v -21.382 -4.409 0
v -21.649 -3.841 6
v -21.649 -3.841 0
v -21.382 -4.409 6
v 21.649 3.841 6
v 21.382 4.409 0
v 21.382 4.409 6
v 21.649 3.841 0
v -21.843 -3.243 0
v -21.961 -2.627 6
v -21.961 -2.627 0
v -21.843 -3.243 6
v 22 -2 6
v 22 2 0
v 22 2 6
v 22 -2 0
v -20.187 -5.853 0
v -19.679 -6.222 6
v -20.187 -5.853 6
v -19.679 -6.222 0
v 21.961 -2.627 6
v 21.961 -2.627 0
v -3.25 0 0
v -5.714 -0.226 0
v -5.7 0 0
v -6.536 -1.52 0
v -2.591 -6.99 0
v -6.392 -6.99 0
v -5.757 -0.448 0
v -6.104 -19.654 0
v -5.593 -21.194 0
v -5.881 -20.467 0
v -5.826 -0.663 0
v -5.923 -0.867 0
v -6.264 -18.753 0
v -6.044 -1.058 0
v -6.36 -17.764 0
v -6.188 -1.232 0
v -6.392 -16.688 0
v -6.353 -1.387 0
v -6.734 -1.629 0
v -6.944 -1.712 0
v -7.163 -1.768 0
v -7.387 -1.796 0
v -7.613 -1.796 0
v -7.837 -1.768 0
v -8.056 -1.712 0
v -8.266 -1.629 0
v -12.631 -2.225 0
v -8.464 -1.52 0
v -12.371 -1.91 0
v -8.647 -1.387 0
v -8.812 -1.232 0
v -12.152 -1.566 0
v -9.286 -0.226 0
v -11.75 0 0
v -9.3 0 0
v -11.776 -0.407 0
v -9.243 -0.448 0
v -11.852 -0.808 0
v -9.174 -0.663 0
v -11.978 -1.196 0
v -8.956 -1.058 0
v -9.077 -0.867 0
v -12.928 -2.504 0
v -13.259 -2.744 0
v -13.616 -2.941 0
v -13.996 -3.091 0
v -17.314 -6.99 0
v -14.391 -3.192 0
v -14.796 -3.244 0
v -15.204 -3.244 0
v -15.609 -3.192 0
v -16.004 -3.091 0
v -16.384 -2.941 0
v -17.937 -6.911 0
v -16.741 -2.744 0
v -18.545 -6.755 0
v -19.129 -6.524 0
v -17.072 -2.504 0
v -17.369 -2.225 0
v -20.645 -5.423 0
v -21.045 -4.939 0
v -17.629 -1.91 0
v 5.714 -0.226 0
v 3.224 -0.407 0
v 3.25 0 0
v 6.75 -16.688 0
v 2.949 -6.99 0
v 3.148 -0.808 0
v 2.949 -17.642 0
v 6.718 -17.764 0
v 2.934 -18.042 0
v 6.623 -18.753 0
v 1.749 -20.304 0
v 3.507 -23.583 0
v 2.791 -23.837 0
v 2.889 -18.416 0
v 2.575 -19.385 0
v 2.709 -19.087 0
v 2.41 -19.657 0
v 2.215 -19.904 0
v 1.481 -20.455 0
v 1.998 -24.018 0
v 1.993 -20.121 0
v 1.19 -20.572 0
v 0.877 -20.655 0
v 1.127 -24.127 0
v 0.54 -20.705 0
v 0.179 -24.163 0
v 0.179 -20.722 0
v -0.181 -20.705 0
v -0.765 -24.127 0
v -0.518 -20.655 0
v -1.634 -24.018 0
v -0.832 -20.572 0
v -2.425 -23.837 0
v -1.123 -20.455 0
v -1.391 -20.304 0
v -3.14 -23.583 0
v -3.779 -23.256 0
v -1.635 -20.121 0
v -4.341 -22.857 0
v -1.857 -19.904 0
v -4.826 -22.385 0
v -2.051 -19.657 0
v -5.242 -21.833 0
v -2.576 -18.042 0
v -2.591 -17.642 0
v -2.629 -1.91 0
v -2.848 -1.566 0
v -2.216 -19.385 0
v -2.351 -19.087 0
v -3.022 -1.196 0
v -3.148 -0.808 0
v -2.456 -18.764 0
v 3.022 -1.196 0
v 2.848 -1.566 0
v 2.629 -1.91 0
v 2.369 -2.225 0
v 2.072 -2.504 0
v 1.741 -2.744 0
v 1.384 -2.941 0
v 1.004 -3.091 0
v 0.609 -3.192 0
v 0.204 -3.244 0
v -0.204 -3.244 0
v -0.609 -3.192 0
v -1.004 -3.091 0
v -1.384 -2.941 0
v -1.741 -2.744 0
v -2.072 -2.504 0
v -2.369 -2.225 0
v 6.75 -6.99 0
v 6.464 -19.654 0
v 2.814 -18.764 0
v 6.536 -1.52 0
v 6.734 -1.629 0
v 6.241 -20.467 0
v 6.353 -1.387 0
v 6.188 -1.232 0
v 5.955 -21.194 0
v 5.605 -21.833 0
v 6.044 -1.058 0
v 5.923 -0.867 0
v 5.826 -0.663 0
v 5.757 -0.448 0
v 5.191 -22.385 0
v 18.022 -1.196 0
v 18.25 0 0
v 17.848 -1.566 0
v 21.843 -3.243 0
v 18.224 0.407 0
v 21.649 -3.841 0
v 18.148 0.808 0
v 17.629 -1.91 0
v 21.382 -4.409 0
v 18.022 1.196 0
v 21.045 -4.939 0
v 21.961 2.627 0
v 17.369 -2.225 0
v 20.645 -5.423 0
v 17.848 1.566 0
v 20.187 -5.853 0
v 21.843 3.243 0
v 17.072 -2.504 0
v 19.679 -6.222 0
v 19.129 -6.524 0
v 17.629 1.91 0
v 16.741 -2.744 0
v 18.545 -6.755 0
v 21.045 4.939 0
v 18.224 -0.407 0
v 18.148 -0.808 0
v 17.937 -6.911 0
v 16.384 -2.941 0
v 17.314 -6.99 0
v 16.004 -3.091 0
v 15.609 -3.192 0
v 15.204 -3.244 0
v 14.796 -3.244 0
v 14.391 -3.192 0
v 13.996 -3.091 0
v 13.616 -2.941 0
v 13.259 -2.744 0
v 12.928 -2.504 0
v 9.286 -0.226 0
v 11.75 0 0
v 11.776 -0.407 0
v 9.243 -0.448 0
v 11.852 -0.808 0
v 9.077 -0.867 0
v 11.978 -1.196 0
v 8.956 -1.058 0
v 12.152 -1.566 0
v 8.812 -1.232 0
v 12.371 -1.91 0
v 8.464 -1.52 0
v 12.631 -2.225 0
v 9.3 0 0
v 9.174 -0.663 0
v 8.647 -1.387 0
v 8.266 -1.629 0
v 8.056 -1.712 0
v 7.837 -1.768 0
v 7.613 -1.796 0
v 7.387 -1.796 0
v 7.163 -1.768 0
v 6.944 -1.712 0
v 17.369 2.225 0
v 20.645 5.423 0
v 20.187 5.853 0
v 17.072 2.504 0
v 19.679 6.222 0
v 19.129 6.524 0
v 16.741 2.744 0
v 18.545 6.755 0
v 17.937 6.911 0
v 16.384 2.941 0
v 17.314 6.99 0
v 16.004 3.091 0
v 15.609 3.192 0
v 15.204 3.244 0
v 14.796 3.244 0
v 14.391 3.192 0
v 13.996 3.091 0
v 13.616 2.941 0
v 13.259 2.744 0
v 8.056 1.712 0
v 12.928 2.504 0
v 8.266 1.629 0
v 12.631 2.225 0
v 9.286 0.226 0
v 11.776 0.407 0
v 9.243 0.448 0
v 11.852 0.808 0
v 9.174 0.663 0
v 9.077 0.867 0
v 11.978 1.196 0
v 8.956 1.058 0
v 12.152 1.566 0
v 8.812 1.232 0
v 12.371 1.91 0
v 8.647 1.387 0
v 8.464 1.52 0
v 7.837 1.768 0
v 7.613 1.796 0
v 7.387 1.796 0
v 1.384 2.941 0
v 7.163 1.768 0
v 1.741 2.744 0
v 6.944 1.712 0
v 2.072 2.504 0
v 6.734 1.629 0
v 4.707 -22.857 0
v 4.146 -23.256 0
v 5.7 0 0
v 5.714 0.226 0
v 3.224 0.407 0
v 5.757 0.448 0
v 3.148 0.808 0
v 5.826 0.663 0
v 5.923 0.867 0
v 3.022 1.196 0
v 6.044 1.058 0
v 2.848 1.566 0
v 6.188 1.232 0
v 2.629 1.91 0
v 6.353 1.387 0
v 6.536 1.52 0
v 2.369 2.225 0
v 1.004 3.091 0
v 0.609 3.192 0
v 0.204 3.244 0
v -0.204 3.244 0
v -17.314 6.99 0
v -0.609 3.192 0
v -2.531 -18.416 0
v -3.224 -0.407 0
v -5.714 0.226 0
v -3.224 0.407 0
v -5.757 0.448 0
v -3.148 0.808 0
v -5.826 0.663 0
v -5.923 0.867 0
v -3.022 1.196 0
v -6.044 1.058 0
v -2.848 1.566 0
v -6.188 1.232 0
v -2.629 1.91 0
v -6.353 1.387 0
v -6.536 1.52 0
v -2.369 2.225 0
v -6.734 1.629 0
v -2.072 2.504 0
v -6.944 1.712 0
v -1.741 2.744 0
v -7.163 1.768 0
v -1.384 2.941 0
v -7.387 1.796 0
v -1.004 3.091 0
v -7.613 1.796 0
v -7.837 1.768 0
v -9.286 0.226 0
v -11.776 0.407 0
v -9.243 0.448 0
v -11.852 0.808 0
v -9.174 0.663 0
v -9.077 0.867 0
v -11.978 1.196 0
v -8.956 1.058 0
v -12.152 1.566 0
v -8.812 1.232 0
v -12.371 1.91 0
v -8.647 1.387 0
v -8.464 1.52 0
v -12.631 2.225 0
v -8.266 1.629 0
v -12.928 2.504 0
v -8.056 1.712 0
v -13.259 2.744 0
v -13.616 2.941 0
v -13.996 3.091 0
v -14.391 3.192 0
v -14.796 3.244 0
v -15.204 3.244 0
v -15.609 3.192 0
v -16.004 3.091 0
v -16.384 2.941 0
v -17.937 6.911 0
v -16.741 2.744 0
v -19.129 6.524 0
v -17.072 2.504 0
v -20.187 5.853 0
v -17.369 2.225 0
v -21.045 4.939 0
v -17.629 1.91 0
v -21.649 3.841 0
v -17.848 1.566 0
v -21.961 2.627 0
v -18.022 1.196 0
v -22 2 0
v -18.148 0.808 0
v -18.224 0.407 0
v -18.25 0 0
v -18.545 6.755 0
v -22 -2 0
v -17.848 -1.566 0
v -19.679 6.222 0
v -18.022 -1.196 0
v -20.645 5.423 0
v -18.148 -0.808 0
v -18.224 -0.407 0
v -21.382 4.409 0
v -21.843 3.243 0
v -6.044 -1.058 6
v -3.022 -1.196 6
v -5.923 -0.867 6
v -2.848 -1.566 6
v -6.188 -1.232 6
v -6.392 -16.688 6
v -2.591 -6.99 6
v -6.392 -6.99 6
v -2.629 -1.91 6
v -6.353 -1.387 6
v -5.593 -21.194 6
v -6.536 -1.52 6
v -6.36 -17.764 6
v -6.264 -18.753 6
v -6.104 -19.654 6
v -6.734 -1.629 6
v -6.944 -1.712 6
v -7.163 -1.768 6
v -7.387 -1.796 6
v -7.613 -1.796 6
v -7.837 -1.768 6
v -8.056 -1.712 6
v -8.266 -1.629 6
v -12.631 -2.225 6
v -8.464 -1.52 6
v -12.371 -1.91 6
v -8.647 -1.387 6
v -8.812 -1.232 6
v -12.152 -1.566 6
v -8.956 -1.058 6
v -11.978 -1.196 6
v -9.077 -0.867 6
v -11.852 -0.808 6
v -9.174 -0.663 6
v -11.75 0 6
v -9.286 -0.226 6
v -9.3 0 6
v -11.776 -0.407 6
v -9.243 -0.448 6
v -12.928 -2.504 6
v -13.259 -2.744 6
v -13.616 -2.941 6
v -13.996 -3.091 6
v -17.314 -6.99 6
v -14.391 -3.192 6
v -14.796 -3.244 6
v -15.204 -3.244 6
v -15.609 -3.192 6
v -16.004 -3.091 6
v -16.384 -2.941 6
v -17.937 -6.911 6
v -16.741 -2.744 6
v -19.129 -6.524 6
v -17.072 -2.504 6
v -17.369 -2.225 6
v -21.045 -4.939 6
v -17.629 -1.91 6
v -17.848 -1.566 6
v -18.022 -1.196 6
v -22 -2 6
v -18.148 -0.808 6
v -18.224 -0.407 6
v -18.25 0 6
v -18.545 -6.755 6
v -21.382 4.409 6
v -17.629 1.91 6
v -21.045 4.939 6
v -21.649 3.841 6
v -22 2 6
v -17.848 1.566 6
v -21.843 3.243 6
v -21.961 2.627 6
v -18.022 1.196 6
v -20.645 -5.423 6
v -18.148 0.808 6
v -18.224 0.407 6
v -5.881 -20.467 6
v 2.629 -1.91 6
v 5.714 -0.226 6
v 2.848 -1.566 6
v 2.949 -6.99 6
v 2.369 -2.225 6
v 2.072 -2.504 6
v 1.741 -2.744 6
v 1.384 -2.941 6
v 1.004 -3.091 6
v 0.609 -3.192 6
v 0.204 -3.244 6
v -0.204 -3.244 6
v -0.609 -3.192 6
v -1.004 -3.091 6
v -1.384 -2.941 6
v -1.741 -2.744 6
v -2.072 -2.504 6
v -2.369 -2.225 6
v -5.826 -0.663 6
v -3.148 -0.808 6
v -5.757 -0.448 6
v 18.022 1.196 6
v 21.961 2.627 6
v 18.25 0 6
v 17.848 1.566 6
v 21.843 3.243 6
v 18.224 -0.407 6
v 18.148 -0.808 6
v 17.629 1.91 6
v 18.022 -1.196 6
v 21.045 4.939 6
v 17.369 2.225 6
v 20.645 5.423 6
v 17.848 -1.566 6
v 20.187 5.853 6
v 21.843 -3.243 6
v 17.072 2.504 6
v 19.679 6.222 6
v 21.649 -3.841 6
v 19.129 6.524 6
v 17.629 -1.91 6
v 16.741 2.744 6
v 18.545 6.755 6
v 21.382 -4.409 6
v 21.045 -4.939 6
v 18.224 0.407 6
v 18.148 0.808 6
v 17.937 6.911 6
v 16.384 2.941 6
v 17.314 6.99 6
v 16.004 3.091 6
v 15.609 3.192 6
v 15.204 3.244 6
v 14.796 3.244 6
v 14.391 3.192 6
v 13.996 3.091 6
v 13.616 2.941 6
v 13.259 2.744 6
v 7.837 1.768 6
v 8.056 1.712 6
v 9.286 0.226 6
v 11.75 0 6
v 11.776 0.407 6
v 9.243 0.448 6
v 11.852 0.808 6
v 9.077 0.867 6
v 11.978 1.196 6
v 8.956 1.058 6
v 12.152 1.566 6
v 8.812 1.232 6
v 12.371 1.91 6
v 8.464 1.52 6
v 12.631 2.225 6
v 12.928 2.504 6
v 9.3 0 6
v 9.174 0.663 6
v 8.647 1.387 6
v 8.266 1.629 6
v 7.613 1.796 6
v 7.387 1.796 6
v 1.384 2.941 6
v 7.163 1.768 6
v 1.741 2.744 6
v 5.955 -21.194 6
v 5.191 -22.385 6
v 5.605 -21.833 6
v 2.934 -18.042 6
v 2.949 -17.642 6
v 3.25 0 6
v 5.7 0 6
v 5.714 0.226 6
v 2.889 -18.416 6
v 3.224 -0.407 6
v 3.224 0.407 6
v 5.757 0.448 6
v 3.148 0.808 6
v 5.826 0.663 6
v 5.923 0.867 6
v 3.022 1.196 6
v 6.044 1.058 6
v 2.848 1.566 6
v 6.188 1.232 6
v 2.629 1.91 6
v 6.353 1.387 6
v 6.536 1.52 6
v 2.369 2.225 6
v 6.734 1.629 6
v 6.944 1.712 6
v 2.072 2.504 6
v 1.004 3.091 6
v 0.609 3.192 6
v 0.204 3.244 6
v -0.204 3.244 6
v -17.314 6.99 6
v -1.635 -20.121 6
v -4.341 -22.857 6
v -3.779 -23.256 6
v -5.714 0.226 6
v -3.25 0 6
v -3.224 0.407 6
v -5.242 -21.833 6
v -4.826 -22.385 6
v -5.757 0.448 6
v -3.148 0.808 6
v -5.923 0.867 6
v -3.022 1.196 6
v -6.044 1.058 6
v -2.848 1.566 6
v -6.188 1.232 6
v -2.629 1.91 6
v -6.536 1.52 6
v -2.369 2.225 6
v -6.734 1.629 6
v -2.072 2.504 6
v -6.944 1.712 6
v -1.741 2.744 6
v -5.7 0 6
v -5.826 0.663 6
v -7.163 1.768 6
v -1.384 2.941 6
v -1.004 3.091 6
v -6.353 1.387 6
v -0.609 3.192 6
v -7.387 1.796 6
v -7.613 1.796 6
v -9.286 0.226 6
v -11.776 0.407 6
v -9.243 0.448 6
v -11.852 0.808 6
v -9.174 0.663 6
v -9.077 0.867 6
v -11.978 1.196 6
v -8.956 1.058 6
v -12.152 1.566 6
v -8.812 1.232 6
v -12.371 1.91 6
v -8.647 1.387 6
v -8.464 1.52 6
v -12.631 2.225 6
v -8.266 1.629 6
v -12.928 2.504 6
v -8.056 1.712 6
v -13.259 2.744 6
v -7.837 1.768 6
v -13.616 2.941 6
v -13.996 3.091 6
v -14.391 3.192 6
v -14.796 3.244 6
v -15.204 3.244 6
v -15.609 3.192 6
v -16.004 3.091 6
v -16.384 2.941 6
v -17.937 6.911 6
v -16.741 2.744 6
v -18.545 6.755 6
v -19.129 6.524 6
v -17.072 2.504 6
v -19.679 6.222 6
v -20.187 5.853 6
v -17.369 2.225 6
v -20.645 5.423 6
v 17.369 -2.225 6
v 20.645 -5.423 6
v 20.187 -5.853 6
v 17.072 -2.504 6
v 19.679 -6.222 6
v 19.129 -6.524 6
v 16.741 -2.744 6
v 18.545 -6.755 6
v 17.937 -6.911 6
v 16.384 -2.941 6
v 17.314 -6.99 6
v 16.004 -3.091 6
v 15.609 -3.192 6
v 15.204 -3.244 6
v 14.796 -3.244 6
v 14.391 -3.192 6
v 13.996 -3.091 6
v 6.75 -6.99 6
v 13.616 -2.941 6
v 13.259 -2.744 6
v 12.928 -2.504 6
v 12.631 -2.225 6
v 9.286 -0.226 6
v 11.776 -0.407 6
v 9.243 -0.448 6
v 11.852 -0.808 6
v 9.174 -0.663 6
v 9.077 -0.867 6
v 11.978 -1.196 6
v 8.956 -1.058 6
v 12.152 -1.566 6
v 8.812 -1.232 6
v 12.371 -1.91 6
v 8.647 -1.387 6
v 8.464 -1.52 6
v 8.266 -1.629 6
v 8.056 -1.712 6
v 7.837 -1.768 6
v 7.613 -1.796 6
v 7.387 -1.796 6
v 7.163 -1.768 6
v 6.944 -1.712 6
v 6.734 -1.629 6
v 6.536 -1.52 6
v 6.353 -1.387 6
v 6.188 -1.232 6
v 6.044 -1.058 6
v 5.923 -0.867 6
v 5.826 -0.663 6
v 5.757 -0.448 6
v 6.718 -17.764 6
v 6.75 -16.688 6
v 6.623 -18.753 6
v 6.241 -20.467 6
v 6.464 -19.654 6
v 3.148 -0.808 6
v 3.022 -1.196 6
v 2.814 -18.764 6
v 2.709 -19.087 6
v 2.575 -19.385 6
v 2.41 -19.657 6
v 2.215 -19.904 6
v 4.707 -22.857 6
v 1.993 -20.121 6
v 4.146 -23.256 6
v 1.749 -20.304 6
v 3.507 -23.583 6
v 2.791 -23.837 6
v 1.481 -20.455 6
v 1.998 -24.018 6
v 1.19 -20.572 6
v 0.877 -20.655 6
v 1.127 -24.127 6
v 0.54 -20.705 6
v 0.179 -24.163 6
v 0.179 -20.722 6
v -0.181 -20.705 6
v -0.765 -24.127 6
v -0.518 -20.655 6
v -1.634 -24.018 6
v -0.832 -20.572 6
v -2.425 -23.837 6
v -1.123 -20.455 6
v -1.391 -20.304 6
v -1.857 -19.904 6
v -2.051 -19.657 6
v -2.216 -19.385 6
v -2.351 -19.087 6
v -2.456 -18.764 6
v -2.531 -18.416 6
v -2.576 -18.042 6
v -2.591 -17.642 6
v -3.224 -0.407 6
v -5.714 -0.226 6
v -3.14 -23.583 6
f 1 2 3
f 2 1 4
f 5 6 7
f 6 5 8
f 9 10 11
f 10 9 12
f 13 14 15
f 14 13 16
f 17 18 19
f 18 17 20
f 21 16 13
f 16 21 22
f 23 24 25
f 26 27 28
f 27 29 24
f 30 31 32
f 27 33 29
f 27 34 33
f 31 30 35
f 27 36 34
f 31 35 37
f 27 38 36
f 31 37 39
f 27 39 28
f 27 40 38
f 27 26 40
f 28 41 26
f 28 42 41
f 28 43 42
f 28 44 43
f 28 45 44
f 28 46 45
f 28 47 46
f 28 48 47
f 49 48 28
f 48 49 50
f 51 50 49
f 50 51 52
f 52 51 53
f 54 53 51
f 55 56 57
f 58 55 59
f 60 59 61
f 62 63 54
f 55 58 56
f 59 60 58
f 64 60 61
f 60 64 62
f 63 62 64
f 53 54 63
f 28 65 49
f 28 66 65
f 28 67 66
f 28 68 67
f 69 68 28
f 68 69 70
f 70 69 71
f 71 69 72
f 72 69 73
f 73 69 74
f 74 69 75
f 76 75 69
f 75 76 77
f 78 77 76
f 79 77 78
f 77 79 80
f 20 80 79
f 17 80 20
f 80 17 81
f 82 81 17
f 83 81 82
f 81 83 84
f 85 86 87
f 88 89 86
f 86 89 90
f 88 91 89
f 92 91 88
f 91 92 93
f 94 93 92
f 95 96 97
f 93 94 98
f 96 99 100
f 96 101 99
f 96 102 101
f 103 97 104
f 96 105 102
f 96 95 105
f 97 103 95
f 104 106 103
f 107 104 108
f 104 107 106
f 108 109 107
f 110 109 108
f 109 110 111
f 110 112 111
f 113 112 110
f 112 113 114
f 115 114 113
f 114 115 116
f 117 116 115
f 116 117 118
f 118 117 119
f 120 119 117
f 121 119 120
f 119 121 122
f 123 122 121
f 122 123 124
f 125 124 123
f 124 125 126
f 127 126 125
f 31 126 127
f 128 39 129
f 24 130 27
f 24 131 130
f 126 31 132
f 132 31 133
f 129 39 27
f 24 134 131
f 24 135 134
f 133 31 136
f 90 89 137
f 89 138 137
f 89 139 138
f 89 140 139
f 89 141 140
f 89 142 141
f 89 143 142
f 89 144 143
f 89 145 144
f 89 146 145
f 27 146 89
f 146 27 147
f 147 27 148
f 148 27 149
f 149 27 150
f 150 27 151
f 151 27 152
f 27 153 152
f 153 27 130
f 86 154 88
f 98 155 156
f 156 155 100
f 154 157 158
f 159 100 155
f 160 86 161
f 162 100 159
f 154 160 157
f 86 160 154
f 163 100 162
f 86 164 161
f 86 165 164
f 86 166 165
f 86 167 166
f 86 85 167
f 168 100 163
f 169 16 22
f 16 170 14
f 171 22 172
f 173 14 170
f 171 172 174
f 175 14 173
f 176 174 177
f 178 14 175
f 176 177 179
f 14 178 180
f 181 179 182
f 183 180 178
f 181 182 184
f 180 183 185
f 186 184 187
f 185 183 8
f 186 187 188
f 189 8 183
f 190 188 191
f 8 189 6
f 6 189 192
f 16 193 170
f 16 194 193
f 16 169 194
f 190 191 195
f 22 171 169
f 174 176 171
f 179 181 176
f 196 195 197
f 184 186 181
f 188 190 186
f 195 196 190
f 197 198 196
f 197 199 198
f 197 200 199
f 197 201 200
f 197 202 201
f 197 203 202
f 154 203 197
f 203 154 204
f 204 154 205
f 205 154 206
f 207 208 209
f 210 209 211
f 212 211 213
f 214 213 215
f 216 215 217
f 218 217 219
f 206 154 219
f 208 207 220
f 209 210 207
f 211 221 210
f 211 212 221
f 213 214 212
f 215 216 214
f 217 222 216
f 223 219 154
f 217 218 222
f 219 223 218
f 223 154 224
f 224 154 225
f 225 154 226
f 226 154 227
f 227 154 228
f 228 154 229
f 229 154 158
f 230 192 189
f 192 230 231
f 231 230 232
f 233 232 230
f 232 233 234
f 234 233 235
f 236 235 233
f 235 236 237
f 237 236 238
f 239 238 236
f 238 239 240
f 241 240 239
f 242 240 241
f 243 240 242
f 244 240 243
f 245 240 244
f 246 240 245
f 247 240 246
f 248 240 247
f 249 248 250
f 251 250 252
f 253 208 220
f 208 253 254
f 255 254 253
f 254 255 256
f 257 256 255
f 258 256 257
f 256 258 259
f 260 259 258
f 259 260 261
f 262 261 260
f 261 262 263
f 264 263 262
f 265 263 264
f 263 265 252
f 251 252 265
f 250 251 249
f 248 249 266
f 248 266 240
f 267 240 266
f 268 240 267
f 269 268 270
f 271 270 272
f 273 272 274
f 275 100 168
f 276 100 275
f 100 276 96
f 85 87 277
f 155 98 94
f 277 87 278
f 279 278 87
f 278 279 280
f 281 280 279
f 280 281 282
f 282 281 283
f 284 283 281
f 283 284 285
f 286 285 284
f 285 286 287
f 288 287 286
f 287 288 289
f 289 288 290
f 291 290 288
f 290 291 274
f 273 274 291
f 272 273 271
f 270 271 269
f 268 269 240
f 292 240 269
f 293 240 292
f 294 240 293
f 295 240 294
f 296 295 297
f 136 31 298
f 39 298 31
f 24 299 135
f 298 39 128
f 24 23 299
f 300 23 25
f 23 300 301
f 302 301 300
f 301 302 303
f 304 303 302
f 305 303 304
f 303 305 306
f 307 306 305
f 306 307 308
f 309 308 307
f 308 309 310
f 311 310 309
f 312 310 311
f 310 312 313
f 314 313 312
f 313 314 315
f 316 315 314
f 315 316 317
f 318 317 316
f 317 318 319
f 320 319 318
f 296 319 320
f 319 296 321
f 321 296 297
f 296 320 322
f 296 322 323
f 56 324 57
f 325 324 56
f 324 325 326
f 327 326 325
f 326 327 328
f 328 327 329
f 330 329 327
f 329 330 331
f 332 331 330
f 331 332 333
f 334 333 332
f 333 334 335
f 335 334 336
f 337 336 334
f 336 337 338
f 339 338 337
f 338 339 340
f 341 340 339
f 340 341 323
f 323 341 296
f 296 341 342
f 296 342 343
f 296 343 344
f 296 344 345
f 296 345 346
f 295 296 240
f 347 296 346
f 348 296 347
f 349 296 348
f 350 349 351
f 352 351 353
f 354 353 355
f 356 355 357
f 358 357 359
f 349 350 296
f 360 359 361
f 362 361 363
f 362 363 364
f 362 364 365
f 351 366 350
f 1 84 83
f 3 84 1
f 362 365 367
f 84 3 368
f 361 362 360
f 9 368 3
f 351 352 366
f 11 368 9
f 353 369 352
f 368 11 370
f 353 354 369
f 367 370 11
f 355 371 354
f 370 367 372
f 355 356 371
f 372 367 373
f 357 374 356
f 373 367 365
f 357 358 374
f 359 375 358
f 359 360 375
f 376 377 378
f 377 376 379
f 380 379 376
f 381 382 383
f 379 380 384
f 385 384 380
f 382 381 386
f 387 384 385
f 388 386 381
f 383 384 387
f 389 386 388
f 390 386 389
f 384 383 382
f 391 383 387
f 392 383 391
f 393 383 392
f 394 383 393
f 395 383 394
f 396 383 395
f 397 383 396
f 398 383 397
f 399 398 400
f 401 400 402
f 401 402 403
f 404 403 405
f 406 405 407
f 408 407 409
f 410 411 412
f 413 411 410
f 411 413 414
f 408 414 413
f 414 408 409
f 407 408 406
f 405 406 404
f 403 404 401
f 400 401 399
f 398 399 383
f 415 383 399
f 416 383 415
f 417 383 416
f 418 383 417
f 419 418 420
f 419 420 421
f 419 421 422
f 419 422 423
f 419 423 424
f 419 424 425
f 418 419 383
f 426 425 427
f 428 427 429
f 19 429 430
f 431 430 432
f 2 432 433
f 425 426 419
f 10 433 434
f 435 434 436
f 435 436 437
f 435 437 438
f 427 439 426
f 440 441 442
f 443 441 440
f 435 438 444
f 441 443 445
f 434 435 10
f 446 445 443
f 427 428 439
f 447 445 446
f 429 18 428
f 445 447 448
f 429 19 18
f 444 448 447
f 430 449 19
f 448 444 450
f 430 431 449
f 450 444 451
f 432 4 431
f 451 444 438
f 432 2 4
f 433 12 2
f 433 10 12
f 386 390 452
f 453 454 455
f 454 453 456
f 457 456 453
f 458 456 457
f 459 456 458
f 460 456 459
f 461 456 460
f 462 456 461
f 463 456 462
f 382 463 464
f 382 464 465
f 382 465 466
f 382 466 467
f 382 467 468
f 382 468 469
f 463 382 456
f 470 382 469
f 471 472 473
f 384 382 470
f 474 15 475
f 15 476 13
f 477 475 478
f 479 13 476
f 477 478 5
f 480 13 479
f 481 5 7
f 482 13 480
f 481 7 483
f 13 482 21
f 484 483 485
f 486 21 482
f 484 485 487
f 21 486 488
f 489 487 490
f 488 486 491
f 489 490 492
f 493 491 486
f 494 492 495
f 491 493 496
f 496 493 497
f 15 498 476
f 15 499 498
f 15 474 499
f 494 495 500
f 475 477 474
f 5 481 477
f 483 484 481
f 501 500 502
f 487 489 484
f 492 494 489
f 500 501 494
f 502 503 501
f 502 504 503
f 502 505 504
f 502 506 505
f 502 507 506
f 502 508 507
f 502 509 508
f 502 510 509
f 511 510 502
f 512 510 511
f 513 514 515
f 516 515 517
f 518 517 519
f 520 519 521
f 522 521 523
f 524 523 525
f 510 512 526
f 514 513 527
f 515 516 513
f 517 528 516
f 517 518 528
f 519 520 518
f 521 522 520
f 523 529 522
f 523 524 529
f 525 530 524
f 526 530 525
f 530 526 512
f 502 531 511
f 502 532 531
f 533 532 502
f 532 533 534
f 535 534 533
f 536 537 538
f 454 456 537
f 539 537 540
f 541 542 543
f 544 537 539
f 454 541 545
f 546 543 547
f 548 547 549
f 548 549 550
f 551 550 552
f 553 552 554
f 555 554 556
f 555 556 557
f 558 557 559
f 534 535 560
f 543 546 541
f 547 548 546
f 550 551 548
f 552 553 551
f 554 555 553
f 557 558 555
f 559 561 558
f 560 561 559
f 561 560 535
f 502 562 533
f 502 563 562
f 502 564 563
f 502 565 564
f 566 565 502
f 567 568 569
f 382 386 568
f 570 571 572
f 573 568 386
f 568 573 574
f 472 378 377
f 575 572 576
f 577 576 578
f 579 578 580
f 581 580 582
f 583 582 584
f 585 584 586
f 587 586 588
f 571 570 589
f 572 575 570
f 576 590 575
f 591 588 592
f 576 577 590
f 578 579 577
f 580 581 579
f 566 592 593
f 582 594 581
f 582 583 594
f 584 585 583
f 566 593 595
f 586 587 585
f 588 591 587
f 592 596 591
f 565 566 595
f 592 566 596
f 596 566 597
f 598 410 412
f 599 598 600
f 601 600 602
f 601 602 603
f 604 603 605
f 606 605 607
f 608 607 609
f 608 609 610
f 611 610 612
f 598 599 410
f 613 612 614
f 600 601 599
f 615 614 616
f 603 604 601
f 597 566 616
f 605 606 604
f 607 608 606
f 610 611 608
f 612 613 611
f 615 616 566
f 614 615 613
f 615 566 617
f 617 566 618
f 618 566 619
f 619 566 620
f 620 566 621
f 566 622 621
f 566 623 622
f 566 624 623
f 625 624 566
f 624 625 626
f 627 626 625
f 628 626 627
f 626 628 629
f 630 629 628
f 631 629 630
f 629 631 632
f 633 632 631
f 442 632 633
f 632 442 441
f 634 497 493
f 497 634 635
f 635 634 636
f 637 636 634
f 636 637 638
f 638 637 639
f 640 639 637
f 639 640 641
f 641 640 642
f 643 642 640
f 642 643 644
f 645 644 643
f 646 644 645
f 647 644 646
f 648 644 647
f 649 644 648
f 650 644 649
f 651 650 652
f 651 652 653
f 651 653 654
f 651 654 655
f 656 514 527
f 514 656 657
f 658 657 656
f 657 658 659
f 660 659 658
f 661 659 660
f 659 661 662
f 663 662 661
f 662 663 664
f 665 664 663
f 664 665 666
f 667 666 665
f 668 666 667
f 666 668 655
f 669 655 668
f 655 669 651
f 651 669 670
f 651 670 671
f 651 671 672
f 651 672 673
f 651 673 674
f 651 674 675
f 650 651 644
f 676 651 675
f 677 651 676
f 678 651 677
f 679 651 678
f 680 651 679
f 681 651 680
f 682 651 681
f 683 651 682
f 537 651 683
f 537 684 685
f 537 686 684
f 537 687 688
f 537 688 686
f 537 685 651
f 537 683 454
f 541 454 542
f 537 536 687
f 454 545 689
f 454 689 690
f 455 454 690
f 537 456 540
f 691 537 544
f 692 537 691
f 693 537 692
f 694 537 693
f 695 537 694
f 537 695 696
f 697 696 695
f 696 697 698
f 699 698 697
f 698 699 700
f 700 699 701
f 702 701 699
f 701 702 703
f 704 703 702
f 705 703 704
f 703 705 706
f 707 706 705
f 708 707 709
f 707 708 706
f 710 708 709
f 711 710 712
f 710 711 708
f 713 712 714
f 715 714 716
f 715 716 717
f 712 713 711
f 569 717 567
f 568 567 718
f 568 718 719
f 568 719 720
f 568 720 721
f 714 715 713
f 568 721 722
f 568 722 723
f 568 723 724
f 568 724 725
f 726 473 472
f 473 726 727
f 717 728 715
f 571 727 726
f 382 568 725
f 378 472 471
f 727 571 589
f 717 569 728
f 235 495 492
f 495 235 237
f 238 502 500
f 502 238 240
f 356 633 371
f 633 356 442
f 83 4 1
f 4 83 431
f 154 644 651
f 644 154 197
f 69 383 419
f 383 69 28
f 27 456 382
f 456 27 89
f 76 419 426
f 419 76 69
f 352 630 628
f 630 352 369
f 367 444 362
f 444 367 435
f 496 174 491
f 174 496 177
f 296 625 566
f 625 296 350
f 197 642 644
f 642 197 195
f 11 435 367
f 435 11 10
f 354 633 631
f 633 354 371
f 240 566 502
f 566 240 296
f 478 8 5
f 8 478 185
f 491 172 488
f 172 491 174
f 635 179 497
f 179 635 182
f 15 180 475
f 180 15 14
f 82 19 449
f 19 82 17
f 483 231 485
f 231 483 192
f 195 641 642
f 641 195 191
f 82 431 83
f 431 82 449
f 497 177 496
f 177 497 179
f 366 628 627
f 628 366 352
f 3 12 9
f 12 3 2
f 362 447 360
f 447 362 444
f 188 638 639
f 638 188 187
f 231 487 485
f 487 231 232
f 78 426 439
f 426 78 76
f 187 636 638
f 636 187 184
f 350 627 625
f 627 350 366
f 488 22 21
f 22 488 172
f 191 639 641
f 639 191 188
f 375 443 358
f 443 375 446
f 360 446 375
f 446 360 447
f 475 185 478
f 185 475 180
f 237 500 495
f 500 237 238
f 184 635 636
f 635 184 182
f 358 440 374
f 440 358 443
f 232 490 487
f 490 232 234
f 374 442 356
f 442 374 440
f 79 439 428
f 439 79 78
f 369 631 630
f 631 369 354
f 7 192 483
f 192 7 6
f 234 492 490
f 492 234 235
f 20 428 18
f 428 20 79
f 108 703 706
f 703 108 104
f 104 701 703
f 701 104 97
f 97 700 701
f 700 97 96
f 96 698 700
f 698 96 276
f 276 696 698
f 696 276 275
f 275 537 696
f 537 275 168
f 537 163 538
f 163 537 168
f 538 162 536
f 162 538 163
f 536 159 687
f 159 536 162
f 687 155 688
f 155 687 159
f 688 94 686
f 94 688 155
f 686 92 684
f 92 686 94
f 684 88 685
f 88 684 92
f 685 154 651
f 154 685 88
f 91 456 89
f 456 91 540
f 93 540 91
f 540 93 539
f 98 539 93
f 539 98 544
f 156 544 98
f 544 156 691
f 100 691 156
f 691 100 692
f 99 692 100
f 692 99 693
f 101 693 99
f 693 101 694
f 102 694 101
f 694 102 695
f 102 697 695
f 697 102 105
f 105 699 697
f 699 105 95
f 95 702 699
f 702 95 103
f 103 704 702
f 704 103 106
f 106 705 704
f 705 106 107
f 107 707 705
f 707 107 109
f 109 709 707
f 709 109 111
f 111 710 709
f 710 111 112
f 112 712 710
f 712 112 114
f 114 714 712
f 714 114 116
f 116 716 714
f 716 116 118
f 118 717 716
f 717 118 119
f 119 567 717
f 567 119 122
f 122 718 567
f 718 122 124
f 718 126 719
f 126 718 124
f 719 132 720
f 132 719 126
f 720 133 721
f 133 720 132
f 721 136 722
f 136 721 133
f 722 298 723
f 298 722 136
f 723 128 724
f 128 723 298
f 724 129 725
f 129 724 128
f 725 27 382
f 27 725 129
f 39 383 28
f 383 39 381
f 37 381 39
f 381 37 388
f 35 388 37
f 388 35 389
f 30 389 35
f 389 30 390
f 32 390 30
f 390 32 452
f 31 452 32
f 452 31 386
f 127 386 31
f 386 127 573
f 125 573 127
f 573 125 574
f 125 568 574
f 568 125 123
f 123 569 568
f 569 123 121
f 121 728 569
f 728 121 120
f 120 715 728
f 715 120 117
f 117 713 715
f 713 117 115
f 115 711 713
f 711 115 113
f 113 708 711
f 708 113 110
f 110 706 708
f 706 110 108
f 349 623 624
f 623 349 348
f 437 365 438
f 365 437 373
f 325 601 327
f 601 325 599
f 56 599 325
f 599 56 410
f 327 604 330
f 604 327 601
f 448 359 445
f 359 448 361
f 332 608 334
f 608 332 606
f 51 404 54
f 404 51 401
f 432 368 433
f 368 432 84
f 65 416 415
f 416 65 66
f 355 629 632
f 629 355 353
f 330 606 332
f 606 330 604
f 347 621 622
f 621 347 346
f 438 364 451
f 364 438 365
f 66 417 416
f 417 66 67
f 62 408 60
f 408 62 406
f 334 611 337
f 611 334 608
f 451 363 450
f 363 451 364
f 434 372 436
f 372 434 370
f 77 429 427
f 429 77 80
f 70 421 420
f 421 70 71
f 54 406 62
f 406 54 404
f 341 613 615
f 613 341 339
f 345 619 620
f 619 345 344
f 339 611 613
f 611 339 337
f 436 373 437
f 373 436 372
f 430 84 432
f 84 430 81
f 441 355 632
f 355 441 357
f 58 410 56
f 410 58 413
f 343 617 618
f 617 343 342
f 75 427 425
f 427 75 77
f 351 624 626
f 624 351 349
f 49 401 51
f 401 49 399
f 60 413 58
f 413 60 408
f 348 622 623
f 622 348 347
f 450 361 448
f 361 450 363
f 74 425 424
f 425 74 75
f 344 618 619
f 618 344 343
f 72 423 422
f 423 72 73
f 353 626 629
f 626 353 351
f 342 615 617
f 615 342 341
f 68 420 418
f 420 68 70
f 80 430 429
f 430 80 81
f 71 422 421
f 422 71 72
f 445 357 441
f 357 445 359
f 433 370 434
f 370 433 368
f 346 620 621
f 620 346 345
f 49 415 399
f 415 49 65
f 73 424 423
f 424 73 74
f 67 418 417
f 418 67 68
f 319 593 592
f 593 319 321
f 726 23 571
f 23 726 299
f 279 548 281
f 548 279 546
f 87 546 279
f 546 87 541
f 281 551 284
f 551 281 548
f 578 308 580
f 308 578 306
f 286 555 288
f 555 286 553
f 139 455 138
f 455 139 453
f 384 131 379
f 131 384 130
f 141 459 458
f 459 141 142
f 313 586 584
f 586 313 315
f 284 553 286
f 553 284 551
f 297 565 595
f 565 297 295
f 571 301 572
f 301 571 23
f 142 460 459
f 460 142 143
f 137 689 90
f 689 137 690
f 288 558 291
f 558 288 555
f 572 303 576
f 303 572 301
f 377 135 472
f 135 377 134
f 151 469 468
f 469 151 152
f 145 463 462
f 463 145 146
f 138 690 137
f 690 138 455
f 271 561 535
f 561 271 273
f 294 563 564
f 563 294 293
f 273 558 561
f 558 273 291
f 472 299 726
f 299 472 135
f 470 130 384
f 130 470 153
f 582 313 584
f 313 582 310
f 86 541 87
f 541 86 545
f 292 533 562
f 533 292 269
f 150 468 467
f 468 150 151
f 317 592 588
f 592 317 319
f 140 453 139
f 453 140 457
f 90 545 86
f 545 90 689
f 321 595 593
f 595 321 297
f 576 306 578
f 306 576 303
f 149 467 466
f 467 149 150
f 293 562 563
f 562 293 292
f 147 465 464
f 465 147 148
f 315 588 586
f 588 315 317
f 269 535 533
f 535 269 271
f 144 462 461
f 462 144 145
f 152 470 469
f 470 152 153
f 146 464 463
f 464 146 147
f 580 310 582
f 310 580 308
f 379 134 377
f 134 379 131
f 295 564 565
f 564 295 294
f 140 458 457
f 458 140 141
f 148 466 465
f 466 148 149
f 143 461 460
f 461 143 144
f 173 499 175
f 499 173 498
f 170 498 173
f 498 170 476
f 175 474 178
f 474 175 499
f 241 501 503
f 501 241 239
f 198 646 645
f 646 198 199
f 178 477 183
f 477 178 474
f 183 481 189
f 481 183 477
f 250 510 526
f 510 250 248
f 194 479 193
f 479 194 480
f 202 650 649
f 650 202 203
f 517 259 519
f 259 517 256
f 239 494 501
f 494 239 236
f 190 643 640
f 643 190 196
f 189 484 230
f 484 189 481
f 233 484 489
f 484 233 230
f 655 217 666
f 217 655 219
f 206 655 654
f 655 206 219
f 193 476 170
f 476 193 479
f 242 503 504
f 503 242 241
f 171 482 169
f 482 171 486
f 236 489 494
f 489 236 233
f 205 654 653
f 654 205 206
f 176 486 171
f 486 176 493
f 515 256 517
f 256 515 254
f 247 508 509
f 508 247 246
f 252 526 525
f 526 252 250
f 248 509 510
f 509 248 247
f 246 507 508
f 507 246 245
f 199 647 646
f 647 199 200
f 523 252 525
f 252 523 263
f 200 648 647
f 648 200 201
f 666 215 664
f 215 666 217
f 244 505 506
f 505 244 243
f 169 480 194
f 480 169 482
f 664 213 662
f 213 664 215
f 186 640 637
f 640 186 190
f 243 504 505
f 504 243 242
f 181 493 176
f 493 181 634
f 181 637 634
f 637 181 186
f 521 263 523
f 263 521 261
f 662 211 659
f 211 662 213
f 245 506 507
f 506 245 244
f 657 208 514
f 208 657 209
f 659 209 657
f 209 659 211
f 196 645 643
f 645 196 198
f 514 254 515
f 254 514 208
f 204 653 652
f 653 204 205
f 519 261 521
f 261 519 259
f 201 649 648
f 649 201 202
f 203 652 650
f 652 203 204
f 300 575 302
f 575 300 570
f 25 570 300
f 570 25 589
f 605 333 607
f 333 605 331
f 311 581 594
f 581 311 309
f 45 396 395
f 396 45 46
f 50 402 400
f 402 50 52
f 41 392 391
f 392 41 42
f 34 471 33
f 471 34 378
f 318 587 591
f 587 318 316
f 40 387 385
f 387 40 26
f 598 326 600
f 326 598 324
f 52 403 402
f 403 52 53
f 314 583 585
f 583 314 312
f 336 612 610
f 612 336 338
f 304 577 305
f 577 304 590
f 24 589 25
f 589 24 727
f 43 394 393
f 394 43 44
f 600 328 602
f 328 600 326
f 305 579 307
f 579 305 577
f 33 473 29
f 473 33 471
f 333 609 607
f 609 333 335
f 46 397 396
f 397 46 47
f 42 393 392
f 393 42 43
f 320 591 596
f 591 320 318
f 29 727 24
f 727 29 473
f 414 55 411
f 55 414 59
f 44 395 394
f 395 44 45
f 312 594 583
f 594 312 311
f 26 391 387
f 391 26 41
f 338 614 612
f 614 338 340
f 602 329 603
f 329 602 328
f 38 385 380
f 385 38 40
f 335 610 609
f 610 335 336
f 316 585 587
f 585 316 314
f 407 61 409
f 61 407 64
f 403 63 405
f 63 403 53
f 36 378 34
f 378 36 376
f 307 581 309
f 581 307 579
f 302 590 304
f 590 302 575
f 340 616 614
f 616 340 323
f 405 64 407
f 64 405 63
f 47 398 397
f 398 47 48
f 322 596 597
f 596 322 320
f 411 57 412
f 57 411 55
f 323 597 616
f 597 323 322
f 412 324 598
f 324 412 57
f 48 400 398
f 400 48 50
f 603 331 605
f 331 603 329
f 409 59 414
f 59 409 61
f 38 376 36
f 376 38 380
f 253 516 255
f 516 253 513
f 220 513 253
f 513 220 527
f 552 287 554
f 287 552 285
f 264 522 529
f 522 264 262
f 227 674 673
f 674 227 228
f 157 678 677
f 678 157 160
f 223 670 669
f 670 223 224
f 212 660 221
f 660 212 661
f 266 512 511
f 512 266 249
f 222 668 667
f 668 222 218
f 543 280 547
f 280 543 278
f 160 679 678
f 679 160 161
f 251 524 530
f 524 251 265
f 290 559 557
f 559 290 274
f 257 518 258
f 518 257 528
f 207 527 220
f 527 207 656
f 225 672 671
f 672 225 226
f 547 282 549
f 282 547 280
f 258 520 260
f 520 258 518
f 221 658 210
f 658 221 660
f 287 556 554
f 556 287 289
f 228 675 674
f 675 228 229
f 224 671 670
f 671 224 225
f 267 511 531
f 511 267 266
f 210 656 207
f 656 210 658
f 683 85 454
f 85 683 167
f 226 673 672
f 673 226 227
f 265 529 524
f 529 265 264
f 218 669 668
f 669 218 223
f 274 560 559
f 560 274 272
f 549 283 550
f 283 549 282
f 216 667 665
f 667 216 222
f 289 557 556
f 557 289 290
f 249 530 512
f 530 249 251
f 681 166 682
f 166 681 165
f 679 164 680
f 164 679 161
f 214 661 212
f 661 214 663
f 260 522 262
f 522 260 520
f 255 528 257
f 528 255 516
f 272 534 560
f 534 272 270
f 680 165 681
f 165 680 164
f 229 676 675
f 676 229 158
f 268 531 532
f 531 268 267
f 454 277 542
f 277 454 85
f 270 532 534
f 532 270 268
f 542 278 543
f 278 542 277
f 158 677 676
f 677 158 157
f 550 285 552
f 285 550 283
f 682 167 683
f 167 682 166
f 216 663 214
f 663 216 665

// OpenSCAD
$fn = 50;


difference() {
	union() {
		hull() {
			translate(v = [-17.0000000000, 2.0000000000, 0]) {
				cylinder(h = 6, r = 5);
			}
			translate(v = [17.0000000000, 2.0000000000, 0]) {
				cylinder(h = 6, r = 5);
			}
			translate(v = [-17.0000000000, -2.0000000000, 0]) {
				cylinder(h = 6, r = 5);
			}
			translate(v = [17.0000000000, -2.0000000000, 0]) {
				cylinder(h = 6, r = 5);
			}
		}
		translate(v = [0, -5, 0]) {
			linear_extrude(height = 6) {
				text(font = "DejaVu Sans Mono:style=Bold", halign = "center", size = 19.0000000000, text = "U", valign = "top");
			}
		}
	}
	union() {
		translate(v = [-15.0000000000, 0.0000000000, 0]) {
			translate(v = [0, 0, -100]) {
				cylinder(h = 200, r = 3.2500000000);
			}
		}
		translate(v = [0, 0, -100]) {
			cylinder(h = 200, r = 3.2500000000);
		}
		translate(v = [15.0000000000, 0.0000000000, 0]) {
			translate(v = [0, 0, -100]) {
				cylinder(h = 200, r = 3.2500000000);
			}
		}
		translate(v = [-15.0000000000, 0.0000000000, 0]) {
			translate(v = [0, 0, -100]) {
				cylinder(h = 200, r = 1.8000000000);
			}
		}
		translate(v = [-7.5000000000, 0.0000000000, 0]) {
			translate(v = [0, 0, -100]) {
				cylinder(h = 200, r = 1.8000000000);
			}
		}
		translate(v = [0, 0, -100]) {
			cylinder(h = 200, r = 1.8000000000);
		}
		translate(v = [7.5000000000, 0.0000000000, 0]) {
			translate(v = [0, 0, -100]) {
				cylinder(h = 200, r = 1.8000000000);
			}
		}
		translate(v = [15.0000000000, 0.0000000000, 0]) {
			translate(v = [0, 0, -100]) {
				cylinder(h = 200, r = 1.8000000000);
			}
		}
	}
}
